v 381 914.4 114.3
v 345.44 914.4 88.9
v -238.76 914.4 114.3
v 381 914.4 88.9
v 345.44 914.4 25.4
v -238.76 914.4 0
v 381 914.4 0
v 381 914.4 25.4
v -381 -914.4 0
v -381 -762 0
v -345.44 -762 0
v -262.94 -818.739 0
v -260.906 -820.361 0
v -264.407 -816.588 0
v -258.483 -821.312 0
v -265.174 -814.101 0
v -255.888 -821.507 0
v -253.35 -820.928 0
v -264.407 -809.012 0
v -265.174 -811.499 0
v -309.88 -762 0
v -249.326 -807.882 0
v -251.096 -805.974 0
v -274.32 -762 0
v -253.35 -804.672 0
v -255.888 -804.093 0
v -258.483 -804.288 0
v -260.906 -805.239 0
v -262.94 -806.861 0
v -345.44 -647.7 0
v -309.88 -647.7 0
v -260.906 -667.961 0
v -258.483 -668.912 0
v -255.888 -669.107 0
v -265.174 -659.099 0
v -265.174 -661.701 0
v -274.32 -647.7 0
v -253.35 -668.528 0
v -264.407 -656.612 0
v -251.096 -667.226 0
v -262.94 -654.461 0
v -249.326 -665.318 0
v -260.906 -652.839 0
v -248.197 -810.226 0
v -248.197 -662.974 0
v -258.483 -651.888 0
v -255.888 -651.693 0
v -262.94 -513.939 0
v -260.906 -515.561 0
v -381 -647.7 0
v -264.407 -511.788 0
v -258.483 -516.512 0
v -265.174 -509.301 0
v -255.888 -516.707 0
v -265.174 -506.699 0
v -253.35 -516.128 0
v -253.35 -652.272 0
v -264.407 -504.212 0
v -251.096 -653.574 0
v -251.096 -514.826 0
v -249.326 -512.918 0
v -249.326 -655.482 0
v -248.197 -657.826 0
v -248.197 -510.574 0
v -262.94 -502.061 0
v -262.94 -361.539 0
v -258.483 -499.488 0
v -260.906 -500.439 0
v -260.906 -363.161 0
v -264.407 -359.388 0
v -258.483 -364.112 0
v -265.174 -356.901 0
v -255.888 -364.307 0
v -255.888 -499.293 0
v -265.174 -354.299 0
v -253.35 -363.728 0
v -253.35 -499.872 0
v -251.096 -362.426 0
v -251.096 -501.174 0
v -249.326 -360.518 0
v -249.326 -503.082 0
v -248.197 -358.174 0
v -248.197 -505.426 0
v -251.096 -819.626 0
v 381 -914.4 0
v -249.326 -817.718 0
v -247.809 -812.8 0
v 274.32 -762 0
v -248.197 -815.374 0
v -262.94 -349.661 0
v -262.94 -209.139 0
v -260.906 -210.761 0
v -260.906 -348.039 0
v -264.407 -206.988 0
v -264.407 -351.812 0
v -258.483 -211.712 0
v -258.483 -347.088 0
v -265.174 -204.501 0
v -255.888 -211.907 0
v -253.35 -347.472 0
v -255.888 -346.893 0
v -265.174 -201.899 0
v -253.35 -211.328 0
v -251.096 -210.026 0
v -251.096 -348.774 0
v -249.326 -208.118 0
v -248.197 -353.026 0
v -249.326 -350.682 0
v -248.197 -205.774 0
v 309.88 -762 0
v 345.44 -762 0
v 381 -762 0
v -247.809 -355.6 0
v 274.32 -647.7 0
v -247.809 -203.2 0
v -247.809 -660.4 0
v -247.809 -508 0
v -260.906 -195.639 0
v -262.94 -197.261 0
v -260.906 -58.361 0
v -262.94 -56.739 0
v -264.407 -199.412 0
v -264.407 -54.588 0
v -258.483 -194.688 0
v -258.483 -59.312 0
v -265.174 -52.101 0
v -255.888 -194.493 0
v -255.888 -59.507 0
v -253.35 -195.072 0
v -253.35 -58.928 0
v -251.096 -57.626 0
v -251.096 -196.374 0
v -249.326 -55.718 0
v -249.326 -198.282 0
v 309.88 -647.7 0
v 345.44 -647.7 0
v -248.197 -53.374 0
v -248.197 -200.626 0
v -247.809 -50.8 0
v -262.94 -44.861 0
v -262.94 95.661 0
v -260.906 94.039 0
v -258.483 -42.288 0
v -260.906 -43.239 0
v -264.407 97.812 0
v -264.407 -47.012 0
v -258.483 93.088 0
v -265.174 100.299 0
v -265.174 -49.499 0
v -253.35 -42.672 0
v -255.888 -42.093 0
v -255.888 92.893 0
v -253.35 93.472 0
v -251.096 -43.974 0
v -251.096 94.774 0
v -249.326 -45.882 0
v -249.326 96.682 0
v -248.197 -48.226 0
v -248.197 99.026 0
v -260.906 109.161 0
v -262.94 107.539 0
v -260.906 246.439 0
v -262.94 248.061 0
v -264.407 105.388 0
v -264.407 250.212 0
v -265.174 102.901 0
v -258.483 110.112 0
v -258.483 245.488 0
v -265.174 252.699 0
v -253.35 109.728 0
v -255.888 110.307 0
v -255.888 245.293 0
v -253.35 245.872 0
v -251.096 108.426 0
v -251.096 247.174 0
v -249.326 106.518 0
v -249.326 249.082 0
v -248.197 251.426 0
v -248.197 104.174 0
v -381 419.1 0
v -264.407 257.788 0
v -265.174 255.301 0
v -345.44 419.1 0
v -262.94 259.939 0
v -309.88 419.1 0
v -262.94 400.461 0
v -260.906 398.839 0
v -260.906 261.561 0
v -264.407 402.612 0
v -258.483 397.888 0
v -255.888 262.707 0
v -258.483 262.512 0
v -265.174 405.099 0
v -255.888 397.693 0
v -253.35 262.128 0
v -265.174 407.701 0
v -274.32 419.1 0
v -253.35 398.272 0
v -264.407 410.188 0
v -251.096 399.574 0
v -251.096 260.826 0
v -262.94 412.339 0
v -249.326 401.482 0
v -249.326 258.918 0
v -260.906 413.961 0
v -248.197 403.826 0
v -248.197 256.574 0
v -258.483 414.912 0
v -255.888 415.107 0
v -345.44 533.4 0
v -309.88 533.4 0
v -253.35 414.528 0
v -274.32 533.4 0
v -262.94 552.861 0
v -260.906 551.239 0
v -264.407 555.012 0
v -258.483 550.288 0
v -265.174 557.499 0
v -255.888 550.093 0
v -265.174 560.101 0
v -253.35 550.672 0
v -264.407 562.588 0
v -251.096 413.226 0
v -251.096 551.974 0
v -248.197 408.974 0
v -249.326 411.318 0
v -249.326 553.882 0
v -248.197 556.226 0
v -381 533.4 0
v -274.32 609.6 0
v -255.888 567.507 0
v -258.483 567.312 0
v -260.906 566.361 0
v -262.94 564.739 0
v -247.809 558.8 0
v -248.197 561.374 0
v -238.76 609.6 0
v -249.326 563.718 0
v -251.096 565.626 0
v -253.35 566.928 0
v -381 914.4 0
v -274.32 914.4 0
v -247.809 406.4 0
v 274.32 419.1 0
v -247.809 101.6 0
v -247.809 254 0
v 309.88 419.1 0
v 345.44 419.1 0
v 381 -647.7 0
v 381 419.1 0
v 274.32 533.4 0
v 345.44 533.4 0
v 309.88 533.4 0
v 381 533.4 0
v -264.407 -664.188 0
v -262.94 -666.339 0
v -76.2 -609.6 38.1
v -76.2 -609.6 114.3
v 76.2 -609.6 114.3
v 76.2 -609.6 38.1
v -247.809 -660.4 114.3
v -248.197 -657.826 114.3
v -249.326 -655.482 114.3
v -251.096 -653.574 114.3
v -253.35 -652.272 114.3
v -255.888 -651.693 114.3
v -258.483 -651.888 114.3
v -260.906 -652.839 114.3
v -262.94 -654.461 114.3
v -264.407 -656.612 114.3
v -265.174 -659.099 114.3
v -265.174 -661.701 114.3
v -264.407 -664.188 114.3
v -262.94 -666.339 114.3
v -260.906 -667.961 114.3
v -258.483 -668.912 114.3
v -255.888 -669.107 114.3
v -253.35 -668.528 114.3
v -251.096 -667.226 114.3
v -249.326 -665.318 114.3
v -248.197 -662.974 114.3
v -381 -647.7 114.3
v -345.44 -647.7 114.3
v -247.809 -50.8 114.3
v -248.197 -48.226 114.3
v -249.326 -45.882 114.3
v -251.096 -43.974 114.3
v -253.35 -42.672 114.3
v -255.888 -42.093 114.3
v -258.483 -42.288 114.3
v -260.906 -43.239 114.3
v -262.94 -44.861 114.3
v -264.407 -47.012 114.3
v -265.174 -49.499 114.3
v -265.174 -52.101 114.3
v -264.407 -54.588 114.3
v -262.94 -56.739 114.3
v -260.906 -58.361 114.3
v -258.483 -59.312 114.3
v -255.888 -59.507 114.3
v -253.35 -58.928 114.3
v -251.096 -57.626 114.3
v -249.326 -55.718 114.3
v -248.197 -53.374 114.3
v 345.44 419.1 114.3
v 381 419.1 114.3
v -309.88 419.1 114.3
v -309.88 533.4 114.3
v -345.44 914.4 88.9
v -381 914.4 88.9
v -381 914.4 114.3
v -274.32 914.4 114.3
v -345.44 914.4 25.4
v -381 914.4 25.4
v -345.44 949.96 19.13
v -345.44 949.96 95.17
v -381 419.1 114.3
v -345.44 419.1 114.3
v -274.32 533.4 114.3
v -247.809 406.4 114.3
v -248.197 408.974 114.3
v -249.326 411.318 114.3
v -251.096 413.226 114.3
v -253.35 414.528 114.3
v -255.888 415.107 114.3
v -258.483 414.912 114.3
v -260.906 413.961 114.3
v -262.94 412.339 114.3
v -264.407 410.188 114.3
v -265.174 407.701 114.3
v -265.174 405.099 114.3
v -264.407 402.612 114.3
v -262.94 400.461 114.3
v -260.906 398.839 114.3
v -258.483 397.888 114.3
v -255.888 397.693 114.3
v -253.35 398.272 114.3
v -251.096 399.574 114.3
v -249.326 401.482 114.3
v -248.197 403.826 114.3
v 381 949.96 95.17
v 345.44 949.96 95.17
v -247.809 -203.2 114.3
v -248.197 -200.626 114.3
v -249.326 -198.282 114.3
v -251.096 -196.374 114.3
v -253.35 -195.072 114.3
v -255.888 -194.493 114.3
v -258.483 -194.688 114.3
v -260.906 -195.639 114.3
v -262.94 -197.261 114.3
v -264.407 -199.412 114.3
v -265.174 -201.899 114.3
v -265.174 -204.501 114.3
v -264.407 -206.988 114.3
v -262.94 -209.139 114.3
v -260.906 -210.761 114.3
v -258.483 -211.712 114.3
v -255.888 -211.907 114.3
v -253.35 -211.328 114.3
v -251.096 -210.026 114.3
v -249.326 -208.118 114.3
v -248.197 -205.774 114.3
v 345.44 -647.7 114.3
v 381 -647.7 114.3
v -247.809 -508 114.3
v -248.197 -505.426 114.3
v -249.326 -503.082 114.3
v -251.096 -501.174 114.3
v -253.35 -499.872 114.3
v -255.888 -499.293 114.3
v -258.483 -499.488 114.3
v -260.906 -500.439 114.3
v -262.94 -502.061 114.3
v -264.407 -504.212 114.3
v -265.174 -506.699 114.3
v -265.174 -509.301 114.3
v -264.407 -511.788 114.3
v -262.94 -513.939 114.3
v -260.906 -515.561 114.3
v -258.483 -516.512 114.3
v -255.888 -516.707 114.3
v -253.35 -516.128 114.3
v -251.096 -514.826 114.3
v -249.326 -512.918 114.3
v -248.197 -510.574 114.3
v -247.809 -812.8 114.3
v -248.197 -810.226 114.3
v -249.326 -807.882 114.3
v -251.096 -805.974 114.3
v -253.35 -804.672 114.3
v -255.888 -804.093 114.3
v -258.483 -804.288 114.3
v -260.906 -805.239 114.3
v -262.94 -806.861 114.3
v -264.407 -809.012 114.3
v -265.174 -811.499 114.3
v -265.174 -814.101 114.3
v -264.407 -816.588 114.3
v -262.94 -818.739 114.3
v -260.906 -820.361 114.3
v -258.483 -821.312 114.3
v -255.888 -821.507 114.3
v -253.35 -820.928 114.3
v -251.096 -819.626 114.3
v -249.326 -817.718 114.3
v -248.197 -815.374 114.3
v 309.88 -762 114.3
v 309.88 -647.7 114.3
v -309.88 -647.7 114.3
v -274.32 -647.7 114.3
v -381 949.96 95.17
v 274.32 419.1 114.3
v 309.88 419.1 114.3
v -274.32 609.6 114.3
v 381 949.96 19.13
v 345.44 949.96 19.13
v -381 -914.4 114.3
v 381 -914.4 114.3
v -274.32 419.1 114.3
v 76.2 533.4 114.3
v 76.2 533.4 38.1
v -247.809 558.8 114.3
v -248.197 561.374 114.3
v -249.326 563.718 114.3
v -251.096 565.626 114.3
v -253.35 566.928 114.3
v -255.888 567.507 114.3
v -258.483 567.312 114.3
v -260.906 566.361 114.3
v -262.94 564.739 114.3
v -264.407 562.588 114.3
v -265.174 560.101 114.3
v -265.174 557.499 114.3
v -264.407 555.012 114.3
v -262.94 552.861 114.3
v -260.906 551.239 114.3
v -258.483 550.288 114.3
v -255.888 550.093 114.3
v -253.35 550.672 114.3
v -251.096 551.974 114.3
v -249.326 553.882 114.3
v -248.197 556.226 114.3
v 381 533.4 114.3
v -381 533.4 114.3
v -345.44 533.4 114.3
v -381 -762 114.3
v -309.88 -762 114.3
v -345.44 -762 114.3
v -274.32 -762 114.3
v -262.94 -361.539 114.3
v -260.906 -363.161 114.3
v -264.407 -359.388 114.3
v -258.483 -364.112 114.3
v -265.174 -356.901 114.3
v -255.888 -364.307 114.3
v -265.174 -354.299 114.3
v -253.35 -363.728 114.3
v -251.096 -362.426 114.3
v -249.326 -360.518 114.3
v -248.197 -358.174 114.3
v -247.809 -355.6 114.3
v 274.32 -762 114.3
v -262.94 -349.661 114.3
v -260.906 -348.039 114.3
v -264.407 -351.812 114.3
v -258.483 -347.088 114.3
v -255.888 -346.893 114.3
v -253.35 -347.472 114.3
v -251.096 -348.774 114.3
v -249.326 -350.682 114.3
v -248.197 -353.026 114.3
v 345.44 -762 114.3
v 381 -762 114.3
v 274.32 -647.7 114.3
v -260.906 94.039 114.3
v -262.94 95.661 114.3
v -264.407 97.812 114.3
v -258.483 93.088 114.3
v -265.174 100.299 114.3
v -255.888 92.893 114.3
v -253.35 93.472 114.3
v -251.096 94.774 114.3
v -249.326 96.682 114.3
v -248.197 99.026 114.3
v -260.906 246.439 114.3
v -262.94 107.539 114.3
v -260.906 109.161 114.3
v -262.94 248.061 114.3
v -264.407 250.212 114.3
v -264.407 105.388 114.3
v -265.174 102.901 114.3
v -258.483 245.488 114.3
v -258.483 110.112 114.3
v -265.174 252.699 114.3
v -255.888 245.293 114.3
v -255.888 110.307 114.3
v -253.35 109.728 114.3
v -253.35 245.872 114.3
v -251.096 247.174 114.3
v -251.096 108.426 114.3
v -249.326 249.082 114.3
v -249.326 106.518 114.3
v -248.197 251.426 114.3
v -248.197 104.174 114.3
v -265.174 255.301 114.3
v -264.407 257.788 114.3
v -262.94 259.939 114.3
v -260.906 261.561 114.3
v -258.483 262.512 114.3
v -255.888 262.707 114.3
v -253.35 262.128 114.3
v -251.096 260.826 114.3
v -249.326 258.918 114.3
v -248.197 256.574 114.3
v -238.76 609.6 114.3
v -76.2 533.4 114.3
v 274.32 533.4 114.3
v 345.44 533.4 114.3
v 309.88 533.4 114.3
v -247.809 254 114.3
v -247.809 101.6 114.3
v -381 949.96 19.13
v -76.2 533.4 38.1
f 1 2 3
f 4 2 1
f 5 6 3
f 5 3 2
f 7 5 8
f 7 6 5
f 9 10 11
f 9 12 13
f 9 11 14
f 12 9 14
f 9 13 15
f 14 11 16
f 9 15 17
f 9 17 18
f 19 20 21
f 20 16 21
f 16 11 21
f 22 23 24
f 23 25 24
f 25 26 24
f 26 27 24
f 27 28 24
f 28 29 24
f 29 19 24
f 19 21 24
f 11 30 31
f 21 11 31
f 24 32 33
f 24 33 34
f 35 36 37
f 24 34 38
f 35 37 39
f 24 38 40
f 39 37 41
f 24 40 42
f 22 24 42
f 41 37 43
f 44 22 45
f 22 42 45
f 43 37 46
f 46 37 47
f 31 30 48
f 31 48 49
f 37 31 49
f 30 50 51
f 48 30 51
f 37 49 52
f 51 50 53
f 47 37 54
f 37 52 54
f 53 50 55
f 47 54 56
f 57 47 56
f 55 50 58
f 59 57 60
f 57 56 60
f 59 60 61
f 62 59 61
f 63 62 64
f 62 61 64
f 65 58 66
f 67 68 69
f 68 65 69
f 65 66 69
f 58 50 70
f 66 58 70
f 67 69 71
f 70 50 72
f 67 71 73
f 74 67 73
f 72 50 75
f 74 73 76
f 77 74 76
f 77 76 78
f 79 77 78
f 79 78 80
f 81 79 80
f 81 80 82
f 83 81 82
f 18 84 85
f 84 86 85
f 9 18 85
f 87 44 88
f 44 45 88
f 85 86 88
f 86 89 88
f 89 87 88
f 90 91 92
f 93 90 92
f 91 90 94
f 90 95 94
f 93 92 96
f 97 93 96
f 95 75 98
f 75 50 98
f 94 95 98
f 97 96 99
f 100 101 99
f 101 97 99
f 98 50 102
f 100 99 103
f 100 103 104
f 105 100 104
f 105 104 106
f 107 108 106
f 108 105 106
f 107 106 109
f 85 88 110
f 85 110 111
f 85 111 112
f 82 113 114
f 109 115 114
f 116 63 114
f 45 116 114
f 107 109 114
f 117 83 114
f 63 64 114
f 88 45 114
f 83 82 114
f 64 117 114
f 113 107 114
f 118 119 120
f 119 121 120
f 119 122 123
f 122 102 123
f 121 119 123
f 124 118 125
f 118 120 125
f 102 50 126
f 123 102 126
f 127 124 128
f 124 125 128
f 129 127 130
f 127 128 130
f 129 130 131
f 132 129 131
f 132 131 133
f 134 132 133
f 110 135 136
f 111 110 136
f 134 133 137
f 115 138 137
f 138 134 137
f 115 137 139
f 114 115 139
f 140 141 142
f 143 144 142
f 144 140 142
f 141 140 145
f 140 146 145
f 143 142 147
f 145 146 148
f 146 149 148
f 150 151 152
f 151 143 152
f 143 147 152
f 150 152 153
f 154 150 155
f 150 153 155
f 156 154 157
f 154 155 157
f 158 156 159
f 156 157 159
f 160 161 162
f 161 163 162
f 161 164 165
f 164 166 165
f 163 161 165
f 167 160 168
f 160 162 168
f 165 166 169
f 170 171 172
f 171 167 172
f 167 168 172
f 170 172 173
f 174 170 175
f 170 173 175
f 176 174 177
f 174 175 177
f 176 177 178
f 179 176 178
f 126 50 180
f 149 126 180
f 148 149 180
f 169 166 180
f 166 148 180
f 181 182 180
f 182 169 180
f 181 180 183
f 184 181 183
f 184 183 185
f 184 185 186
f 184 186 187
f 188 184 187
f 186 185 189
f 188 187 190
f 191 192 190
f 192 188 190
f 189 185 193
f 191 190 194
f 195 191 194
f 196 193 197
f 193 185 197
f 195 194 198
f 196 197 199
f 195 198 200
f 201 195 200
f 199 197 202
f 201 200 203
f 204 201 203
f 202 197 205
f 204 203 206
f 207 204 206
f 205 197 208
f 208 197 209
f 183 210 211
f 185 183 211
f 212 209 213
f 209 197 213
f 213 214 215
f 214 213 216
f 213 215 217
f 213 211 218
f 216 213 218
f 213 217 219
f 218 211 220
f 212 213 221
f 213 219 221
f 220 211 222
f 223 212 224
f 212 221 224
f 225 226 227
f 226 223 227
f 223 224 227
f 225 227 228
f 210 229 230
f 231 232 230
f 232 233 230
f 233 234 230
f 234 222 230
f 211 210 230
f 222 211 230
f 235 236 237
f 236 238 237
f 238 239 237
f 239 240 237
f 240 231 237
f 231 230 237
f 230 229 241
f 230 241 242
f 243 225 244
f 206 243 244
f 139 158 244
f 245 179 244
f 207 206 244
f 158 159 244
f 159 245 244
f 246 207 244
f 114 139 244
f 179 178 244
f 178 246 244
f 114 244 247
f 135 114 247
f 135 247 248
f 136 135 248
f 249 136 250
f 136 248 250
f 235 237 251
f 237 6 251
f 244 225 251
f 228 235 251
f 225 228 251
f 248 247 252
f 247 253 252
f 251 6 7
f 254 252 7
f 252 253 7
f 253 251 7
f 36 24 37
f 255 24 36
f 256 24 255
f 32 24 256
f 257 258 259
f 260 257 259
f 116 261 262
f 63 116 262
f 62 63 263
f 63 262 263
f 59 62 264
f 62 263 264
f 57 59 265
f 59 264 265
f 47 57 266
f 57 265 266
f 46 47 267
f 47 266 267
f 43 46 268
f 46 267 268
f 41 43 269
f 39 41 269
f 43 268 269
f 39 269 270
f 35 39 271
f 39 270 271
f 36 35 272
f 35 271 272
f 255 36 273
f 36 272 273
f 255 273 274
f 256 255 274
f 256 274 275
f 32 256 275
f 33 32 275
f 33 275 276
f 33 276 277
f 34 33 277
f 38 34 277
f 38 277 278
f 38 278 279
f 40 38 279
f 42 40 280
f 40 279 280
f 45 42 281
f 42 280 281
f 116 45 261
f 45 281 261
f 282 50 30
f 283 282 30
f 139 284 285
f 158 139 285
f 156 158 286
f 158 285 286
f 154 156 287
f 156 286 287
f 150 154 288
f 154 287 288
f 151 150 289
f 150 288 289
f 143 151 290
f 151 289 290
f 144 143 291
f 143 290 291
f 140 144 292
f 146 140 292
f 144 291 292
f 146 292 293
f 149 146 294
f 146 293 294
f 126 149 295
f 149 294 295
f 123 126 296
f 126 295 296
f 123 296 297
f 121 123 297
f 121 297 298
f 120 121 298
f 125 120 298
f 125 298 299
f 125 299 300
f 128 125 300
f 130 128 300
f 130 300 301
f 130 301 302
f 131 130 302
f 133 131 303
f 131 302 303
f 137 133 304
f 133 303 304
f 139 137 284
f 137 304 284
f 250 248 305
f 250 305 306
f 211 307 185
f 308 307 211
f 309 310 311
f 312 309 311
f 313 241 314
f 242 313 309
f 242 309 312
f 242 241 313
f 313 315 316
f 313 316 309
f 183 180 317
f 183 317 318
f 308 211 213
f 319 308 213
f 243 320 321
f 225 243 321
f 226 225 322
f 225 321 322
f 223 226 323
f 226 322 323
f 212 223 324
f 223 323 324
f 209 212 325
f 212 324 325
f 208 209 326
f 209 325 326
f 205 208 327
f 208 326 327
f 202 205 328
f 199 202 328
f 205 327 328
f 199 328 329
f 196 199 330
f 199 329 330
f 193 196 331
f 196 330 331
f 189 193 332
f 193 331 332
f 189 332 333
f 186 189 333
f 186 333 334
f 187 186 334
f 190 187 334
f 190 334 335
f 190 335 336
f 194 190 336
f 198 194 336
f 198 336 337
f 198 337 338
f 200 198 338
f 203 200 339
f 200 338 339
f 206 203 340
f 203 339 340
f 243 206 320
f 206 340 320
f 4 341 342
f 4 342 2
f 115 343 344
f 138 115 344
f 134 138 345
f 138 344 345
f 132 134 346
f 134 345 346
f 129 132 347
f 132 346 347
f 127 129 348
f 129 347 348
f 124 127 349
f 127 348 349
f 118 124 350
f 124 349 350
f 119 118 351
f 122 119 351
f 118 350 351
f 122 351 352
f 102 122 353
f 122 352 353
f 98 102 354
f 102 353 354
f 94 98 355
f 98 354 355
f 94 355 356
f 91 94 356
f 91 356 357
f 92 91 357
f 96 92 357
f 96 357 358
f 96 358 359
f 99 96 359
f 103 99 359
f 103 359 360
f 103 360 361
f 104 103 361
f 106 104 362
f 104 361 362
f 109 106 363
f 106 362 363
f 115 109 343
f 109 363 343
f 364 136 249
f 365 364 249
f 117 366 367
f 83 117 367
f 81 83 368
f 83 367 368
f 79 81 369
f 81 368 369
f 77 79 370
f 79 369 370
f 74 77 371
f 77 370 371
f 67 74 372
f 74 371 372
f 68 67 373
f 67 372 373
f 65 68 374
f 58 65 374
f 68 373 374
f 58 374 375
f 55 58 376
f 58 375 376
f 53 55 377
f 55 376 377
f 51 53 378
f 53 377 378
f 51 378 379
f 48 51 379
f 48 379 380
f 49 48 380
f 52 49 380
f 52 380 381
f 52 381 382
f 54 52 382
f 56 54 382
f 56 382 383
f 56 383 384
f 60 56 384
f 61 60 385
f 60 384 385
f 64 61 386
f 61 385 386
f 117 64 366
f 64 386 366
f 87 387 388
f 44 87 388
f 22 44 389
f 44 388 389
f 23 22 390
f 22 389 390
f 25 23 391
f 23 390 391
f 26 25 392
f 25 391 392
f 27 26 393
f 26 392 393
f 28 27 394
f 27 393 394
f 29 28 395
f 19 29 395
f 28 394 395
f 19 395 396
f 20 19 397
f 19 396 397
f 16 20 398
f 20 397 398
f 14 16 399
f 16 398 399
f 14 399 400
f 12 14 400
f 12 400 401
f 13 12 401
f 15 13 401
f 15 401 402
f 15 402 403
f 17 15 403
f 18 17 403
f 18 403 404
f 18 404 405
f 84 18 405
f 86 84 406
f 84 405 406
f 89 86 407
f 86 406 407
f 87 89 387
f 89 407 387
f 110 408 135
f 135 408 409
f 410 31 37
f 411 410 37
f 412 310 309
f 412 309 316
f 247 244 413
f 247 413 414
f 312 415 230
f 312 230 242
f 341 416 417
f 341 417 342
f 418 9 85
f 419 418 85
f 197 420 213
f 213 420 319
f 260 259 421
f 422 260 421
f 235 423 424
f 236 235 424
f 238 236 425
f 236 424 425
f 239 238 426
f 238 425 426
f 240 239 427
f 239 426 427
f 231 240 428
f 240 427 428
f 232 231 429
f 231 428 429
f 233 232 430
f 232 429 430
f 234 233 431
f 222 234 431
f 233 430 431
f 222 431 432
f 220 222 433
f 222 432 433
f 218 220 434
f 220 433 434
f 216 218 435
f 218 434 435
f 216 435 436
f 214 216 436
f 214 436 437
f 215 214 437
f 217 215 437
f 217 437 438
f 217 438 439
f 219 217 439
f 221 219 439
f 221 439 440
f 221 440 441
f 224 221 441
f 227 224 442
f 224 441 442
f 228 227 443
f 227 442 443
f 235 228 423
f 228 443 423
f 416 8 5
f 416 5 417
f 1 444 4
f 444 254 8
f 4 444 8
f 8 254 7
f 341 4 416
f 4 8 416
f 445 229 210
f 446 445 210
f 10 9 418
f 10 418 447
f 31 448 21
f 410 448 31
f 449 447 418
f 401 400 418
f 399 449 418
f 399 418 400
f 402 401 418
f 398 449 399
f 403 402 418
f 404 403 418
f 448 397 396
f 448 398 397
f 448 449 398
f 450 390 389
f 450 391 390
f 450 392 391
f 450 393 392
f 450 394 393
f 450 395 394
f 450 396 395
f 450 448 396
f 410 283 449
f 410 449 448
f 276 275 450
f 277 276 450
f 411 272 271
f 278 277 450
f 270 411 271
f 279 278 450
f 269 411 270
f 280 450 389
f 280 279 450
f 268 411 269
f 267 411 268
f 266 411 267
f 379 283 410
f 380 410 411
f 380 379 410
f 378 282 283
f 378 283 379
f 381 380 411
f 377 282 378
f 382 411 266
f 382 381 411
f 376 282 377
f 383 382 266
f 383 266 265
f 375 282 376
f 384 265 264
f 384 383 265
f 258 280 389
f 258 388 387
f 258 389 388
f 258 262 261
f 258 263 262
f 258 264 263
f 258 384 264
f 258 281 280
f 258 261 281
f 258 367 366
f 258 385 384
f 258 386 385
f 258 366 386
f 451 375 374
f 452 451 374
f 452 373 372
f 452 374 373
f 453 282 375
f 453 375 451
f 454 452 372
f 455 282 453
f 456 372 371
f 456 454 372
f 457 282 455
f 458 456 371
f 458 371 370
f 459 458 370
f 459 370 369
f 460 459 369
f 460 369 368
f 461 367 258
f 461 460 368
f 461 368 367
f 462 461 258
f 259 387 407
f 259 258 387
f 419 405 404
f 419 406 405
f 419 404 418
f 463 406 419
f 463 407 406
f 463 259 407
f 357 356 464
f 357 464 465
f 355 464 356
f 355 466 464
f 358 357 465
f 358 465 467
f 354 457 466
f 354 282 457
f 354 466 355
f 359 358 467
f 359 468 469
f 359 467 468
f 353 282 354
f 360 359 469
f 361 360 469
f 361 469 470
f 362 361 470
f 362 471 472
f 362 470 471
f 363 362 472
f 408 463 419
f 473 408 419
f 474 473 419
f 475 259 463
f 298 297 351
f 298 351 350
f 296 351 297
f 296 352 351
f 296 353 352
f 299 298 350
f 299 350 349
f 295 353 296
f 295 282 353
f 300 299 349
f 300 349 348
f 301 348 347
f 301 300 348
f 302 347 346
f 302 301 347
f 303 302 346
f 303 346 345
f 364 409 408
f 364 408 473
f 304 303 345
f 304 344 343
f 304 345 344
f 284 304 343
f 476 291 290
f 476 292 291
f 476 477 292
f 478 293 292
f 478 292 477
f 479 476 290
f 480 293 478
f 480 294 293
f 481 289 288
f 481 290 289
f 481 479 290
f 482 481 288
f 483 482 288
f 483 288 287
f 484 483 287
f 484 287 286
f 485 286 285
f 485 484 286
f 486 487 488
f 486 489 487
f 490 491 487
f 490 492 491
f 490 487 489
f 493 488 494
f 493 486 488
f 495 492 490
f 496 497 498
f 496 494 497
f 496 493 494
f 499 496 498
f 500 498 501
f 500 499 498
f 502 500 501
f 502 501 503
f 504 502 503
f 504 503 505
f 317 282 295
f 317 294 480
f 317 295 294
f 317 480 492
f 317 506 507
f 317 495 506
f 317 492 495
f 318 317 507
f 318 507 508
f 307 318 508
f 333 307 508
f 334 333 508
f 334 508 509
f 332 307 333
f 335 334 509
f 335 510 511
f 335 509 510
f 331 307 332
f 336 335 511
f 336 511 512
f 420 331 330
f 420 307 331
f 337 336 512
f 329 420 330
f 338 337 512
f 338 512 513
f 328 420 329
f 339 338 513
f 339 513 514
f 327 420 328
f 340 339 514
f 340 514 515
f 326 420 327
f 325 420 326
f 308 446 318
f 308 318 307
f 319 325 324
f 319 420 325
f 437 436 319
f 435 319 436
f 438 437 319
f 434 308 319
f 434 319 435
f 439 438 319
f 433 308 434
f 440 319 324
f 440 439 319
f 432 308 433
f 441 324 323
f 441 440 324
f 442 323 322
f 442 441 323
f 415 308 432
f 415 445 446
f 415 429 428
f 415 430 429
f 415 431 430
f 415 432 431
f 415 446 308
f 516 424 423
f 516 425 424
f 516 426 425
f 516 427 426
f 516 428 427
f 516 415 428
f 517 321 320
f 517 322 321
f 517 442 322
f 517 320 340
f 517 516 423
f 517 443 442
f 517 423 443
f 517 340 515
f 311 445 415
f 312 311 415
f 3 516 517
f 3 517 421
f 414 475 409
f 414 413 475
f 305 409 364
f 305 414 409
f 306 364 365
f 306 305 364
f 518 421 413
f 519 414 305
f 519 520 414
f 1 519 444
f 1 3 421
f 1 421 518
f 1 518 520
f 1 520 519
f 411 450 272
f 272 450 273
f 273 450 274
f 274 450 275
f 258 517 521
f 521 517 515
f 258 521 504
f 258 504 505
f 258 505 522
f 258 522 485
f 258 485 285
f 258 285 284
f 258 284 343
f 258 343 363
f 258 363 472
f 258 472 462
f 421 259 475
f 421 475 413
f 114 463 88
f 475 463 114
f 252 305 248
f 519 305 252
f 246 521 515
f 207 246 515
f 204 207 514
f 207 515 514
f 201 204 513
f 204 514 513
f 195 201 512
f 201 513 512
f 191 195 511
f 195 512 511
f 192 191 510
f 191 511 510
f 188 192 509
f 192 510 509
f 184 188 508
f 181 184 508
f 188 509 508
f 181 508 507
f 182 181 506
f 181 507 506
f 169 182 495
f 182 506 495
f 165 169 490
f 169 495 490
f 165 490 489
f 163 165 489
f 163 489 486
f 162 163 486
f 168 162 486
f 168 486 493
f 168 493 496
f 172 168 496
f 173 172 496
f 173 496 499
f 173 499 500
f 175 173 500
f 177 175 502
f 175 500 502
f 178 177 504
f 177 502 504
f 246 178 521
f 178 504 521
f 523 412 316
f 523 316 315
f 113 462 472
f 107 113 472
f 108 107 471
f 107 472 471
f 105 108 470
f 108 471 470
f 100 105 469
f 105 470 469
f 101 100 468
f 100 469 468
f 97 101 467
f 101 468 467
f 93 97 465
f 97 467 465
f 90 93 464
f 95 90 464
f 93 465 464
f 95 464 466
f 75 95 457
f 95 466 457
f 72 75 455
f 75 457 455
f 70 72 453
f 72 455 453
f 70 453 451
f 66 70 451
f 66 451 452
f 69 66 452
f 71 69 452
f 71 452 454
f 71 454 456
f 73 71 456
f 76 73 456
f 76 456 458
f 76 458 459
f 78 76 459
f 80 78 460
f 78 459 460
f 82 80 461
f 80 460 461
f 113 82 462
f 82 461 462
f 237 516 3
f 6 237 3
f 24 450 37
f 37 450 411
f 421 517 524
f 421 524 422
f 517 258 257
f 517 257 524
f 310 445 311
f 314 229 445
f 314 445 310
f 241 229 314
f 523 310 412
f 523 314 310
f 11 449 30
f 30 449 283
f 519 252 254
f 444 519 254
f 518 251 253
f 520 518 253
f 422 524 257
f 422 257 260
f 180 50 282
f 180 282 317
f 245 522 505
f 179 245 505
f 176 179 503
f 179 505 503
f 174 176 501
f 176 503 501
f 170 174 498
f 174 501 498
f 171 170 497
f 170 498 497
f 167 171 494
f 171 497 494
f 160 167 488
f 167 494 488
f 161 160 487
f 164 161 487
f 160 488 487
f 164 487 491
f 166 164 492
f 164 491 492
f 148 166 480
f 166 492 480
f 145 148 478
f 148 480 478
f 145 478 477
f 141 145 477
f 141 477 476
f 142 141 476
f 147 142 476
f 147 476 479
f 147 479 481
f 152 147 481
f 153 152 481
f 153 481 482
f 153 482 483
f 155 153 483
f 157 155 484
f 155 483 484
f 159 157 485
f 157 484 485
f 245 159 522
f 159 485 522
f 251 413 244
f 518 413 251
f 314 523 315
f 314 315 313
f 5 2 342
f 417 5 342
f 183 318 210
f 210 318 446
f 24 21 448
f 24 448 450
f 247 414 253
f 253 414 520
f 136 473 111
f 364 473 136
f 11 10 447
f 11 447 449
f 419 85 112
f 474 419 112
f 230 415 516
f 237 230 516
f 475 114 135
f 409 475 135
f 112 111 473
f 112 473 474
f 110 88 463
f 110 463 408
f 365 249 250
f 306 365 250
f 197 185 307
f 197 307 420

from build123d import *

# Parameters (mm, degrees)
F0_W      = 762
F0_H      = 1828.8
F1_DEPTH  = 114.3
F2_W      = 35.56
F2_H      = 114.3
F3_DEPTH  = 114.3
F4_W      = 152.4
F4_H      = 1143
F5_DEPTH  = 76.2
F6_W      = 35.56
F6_H      = 304.8
F7_DEPTH  = 114.3
F9_DEPTH  = 35.56
F11_DEPTH = 35.56
F12_R     = 8.73125
F13_DEPTH = 114.3


with BuildPart() as f1:
    # F0 (on Top) → F1 (new body)
    with BuildSketch(Plane.XY):
        Rectangle(F0_W, F0_H)
    extrude(amount=F1_DEPTH)

    # F2 (on face) → F3 (cut, through all)
    with BuildSketch(Plane.XY.offset(114.3)):
        with Locations((-292.1, 476.25)):
            Rectangle(F2_W, F2_H)
        with Locations((292.1, 476.25)):
            Rectangle(F2_W, F2_H)
        with Locations((-292.1, -704.85)):
            Rectangle(F2_W, F2_H)
        with Locations((292.1, -704.85)):
            Rectangle(F2_W, F2_H)
        with Locations((-363.22, 476.25)):
            Rectangle(F2_W, F2_H)
        with Locations((-363.22, -704.85)):
            Rectangle(F2_W, F2_H)
        with Locations((363.22, 476.25)):
            Rectangle(F2_W, F2_H)
        with Locations((363.22, -704.85)):
            Rectangle(F2_W, F2_H)
    extrude(amount=-F3_DEPTH, mode=Mode.SUBTRACT)

    # F4 (on face) → F5 (cut)
    with BuildSketch(Plane.XY.offset(114.3)):
        with Locations((0, -38.1)):
            Rectangle(F4_W, F4_H)
    extrude(amount=-F5_DEPTH, mode=Mode.SUBTRACT)

    # F6 (on face) → F7 (cut, through all)
    with BuildSketch(Plane.XY.offset(114.3)):
        with Locations((-256.54, 762)):
            Rectangle(F6_W, F6_H)
    extrude(amount=-F7_DEPTH, mode=Mode.SUBTRACT)

    # F8 (on face) → F9 (join)
    with BuildSketch(Plane(origin=(-381, 0, 0), x_dir=(0, -1, 0), z_dir=(-1, 0, 0))):
        Polygon((-914.4, 25.4), (-914.4, 88.9), (-949.96, 95.170187), (-949.96, 19.129813), align=None)
    extrude(amount=-F9_DEPTH)

    # F10 (on face) → F11 (join)
    with BuildSketch(Plane.YZ.offset(381)):
        Polygon((949.96, 95.170187), (914.4, 88.9), (914.4, 25.4), (949.96, 19.129813), align=None)
    extrude(amount=-F11_DEPTH)

    # F12 (on face) → F13 (cut, through all)
    with BuildSketch(Plane.XY.offset(114.3)):
        with Locations((-256.54, 558.8)):
            Circle(F12_R)
        with Locations((-256.54, 406.4)):
            Circle(F12_R)
        with Locations((-256.54, 254)):
            Circle(F12_R)
        with Locations((-256.54, 101.6)):
            Circle(F12_R)
        with Locations((-256.54, -50.8)):
            Circle(F12_R)
        with Locations((-256.54, -203.2)):
            Circle(F12_R)
        with Locations((-256.54, -355.6)):
            Circle(F12_R)
        with Locations((-256.54, -508)):
            Circle(F12_R)
        with Locations((-256.54, -660.4)):
            Circle(F12_R)
        with Locations((-256.54, -812.8)):
            Circle(F12_R)
    extrude(amount=-F13_DEPTH, mode=Mode.SUBTRACT)


solid = f1.part
